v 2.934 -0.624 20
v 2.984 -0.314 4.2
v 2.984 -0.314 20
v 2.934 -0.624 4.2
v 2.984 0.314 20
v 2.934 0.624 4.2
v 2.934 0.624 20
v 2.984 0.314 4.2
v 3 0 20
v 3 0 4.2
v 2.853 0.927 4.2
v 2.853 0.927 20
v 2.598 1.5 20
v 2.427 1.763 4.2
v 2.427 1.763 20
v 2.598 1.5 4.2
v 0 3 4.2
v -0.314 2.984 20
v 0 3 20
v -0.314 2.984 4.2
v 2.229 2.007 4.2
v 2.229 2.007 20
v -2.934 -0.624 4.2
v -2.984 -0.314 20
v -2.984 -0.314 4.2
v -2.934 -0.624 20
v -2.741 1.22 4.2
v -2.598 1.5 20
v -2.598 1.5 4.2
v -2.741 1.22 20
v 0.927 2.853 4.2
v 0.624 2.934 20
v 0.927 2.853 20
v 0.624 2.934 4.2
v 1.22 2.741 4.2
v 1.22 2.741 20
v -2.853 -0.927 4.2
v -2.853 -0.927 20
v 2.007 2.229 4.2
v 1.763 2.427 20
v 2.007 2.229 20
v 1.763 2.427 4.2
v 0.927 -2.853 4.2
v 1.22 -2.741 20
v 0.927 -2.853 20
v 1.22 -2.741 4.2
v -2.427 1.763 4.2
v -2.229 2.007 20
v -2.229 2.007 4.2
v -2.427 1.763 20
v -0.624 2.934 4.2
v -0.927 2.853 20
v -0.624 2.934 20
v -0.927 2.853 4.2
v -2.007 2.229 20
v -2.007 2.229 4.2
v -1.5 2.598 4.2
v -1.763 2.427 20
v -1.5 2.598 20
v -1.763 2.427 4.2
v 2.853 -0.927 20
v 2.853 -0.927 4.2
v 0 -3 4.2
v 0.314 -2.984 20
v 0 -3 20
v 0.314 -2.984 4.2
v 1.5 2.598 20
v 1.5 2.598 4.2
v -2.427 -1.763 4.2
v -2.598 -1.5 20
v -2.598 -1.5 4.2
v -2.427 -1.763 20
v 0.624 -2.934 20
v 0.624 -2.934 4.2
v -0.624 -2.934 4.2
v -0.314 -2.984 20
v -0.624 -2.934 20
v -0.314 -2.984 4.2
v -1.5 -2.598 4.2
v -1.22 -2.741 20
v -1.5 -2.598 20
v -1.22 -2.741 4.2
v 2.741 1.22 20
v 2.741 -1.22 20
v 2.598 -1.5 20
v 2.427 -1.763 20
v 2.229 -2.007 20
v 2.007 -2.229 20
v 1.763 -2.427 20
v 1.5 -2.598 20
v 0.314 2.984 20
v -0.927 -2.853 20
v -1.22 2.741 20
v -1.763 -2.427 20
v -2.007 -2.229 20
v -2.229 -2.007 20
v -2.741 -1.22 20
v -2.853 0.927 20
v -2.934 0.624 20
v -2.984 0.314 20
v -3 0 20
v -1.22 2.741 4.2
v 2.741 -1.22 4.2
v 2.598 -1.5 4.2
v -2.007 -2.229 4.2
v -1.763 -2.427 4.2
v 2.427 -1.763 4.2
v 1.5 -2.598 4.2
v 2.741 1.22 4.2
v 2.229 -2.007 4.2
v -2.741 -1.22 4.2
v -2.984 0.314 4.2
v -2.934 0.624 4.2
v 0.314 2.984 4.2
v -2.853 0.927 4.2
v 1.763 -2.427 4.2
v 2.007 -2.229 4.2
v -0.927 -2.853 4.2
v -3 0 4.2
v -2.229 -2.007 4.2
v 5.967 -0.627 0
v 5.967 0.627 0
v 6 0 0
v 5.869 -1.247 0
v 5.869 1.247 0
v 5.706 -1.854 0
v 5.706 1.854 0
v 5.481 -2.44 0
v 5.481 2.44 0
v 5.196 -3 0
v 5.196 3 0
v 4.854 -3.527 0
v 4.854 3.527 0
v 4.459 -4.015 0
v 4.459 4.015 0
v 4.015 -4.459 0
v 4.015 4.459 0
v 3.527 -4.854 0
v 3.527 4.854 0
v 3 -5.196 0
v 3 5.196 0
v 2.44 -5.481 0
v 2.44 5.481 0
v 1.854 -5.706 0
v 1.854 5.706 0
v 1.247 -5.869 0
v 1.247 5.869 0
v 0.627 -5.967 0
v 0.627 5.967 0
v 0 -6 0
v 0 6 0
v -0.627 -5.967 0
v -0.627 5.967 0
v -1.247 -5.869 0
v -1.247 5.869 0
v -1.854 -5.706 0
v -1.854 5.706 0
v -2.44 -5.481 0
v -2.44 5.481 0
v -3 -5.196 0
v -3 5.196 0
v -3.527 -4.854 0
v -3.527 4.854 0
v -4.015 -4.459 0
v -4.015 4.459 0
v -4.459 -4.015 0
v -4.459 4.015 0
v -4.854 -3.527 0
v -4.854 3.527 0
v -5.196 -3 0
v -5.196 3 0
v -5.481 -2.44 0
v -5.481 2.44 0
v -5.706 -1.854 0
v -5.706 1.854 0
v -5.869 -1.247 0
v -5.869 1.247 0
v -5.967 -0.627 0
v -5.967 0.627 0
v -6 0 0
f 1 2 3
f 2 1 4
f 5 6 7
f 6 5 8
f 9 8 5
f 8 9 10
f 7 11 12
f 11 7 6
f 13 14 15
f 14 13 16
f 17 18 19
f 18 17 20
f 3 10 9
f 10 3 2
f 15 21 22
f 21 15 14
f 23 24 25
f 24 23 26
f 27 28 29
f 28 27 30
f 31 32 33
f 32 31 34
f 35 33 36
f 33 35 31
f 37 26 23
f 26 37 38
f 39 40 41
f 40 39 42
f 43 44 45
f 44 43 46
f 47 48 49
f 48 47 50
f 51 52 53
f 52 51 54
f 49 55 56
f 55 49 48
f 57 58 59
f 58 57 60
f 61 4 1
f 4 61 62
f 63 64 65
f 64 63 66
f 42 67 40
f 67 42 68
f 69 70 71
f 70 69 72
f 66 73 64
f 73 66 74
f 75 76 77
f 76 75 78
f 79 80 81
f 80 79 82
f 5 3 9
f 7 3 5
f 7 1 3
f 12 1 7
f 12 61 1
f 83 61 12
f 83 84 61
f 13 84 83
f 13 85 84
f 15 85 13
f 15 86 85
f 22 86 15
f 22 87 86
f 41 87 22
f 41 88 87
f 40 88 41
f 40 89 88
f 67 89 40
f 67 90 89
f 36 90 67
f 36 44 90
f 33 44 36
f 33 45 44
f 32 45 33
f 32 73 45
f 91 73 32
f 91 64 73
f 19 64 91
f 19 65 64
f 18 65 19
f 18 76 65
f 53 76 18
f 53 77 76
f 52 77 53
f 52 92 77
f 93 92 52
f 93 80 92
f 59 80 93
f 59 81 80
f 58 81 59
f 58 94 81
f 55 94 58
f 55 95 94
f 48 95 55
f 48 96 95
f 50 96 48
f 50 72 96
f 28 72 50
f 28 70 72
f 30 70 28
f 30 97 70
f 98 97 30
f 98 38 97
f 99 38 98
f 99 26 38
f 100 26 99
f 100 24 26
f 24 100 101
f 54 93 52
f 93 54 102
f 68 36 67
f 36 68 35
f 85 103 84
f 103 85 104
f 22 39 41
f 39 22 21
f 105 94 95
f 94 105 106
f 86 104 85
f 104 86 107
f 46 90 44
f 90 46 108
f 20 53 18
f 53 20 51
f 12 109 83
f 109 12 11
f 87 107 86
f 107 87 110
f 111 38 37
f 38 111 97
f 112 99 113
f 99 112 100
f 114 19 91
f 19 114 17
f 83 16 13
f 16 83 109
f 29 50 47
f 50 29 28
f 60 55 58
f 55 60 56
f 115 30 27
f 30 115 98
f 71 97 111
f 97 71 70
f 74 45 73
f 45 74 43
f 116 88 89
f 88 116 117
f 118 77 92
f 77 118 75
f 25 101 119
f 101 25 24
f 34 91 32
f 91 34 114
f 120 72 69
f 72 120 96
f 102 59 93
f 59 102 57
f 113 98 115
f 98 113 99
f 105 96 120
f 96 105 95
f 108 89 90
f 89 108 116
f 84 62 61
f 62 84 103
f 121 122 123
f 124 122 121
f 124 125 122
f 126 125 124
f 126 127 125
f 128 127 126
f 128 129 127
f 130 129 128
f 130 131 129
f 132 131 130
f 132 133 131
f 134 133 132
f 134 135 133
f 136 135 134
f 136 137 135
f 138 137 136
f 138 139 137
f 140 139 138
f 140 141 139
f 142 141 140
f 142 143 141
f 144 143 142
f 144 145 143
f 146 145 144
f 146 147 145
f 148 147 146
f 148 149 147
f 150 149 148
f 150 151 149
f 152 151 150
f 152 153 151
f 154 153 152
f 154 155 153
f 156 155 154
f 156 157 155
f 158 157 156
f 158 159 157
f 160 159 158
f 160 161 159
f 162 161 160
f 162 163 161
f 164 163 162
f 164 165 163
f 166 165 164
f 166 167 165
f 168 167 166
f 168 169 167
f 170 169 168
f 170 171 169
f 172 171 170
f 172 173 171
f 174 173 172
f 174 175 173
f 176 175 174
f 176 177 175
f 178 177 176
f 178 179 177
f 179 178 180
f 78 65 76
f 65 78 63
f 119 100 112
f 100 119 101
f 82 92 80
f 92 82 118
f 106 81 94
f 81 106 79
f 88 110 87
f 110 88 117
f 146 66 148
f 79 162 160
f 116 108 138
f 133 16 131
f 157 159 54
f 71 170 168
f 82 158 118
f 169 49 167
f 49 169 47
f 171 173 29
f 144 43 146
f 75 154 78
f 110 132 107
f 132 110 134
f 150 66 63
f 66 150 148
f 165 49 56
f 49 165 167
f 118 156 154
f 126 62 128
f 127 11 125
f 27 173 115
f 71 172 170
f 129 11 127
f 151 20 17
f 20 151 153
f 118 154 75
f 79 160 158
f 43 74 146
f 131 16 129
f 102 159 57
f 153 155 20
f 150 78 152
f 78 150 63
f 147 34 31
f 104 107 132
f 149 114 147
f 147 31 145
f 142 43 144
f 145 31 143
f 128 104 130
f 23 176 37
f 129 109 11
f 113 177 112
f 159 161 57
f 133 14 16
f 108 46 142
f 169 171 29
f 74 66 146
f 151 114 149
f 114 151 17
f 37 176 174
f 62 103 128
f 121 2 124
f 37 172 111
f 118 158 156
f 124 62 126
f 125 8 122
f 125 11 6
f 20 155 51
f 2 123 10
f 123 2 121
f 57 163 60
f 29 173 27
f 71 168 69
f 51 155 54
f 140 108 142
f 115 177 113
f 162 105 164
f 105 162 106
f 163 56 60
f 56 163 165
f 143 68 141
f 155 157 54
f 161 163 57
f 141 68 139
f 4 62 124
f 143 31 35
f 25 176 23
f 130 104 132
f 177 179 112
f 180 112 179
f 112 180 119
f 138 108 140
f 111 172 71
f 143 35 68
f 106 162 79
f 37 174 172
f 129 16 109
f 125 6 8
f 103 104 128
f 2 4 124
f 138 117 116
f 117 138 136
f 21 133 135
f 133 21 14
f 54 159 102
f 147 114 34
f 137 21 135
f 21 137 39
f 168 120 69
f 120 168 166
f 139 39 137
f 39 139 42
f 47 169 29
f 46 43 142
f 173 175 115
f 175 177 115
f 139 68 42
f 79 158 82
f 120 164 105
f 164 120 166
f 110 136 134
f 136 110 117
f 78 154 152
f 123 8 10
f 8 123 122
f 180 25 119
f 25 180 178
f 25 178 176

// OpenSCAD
// Solid rivet.
$fn = 60;
eps = 0.02;
shank_d = 6;
head_d = 12;
length = 20;
union() { cylinder(d=shank_d,h=length); cylinder(d1=head_d,d2=shank_d,h=head_d*0.35); }
